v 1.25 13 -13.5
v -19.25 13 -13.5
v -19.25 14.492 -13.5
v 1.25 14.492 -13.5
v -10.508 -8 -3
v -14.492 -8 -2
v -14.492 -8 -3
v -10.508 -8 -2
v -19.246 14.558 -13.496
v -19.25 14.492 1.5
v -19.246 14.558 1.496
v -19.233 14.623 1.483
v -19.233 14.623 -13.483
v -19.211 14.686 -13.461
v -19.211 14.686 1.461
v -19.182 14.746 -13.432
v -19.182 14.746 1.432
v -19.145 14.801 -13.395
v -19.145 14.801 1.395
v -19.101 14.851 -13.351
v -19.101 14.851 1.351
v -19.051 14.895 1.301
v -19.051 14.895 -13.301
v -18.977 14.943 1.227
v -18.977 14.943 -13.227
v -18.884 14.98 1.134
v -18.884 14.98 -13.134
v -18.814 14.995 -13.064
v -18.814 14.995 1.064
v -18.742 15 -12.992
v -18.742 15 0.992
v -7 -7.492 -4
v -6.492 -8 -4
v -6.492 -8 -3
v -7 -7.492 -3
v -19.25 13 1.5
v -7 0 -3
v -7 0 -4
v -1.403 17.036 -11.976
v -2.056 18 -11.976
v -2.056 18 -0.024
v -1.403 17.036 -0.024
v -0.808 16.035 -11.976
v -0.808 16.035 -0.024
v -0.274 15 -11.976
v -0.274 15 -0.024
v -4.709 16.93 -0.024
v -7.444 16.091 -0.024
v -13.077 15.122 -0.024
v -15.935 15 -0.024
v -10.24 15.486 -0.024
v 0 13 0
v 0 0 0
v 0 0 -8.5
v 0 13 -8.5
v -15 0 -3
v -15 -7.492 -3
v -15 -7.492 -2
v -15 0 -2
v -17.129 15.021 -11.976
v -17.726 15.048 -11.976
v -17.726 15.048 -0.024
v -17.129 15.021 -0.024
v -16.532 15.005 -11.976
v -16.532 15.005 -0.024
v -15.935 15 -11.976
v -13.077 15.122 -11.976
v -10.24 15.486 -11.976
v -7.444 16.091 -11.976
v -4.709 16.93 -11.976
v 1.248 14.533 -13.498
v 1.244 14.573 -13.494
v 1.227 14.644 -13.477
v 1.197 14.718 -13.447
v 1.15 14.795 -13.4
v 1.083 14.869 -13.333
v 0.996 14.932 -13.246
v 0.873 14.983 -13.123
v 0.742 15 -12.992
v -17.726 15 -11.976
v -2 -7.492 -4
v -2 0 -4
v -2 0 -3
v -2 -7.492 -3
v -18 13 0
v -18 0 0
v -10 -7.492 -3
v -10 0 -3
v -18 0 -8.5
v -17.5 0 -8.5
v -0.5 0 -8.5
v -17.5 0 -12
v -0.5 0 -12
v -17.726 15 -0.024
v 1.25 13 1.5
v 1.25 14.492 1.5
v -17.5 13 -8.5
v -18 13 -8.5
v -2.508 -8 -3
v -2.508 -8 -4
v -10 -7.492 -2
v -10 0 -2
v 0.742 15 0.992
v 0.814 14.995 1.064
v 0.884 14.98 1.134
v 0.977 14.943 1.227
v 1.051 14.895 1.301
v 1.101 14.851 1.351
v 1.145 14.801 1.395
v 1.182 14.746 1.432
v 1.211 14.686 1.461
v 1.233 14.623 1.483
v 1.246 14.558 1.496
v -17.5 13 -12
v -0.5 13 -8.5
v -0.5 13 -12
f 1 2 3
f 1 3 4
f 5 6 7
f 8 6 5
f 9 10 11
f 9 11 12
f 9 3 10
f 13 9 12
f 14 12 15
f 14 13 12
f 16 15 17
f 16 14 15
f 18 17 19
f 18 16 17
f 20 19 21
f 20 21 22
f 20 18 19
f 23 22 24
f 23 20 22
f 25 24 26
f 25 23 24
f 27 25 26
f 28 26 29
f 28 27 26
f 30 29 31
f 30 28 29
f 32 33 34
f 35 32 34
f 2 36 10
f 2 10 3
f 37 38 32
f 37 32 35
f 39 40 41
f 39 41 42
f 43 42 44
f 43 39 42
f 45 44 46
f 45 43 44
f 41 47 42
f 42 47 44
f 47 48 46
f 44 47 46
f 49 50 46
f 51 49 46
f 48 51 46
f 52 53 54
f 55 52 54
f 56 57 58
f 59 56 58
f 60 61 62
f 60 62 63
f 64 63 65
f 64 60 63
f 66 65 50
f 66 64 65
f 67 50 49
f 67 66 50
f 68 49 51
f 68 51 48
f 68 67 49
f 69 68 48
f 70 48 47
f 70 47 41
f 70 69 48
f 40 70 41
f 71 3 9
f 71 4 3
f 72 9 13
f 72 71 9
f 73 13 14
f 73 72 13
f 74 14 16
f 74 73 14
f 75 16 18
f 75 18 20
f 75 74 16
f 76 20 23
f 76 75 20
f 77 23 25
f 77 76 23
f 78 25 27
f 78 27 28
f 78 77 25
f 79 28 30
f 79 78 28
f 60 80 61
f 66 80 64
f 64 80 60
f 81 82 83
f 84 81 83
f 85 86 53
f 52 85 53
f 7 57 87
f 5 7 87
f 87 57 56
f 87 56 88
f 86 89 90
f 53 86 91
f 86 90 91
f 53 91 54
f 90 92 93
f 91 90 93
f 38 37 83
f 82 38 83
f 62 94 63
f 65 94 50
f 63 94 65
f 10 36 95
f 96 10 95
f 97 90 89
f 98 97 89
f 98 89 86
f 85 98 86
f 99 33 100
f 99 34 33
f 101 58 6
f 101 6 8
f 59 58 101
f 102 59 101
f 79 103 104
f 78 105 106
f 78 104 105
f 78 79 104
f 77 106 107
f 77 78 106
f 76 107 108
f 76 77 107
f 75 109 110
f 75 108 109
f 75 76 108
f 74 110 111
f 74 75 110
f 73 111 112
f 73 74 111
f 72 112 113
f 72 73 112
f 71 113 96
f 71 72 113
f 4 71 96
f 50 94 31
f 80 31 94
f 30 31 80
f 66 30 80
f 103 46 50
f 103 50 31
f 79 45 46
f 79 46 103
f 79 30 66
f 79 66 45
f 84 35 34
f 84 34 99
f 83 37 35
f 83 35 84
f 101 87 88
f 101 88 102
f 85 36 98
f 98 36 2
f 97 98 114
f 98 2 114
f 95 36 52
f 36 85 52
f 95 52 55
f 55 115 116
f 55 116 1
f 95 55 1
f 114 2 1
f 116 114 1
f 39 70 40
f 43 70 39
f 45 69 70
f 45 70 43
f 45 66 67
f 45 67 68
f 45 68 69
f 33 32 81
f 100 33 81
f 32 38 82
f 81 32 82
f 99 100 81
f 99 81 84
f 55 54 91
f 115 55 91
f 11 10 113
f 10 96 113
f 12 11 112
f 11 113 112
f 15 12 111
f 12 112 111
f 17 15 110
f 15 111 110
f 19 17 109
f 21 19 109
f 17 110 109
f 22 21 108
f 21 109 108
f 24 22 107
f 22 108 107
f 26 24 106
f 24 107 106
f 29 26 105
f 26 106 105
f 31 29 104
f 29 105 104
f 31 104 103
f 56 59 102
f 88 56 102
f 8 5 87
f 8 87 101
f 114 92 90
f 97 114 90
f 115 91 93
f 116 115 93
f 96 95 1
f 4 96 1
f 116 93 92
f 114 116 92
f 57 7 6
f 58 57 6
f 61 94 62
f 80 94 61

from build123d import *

# Parameters (mm, degrees)
BOSS_EXTRUDE1_DEPTH   = 13
SKETCH2_W             = 20.5
SKETCH2_H             = 15
BOSS_EXTRUDE2_DEPTH   = 2
FILLET1_R             = 0.508
SKETCH3_W             = 17.452
SKETCH3_H             = 11.952
BOSS_EXTRUDE3_DEPTH   = 3
CUT_EXTRUDE2_START    = -11.952
CUT_EXTRUDE2_DEPTH    = 11.952
SKETCH6_W             = 5
SKETCH6_H             = 1
BOSS_EXTRUDE4_DEPTH   = 8
BOSS_EXTRUDE4_2_DEPTH = 8
CHAMFER1_SIZE         = 0.508
CHAMFER2_SIZE         = 0.508


# Read off the part's stored shape, not the designer's step: Cut-Extrude2
with BuildPart() as part:
    # Sketch1 → Boss-Extrude1 (new body)
    with BuildSketch(Plane(origin=(0, 0, 0), x_dir=(1, 0, 0), z_dir=(0, 1, 0))):
        Polygon((-17.5, 12), (-17.5, 8.5), (-18, 8.5), (-18, 0), (0, 0), (0, 8.5), (-0.5, 8.5), (-0.5, 12), align=None)
    extrude(amount=BOSS_EXTRUDE1_DEPTH)

    # Sketch2 → Boss-Extrude2 (add)
    with BuildSketch(Plane(origin=(0, 13, 0), x_dir=(1, 0, 0), z_dir=(0, 1, 0))):
        with Locations((-9, 6)):
            Rectangle(SKETCH2_W, SKETCH2_H)
    extrude(amount=BOSS_EXTRUDE2_DEPTH)

    # Fillet1
    fillet1_edges = [part.edges().sort_by_distance(p)[0] for p in [
        (-19.25, 15, -6),
        (-9, 15, 1.5),
        (1.25, 15, -6),
        (-9, 15, -13.5),
    ]]
    fillet(fillet1_edges, radius=FILLET1_R)

    # Sketch3 → Boss-Extrude3 (add)
    with BuildSketch(Plane(origin=(0, 15, 0), x_dir=(1, 0, 0), z_dir=(0, 1, 0))):
        with Locations((-9, 6)):
            Rectangle(SKETCH3_W, SKETCH3_H)
    extrude(amount=BOSS_EXTRUDE3_DEPTH)

    # Cut-Extrude2 outline → Cut-Extrude2 (cut)
    with BuildSketch(Plane.XY.offset(-0.024).offset(CUT_EXTRUDE2_START)):
        with BuildLine():
            Line((-0.274, 18), (-2.056001882, 18))
            ThreePointArc((-2.056001882, 18), (-1.098307975, 16.539615664), (-0.274, 15))
            Line((-0.274, 15), (-0.274, 18))
        make_face()
        with BuildLine():
            ThreePointArc((-17.726, 15.047770582), (-9.713352624, 15.580954239), (-2.056001882, 18))
            Line((-2.056001882, 18), (-17.726, 18))
            Line((-17.726, 18), (-17.726, 15.047770582))
        make_face()
    extrude(amount=CUT_EXTRUDE2_DEPTH, mode=Mode.SUBTRACT)


with BuildPart() as body_2:
    # Sketch6 → Boss-Extrude4 (new body)
    with BuildSketch(Plane.XZ):
        with Locations((-4.5, -3.5)):
            Rectangle(SKETCH6_W, SKETCH6_H)
    extrude(amount=BOSS_EXTRUDE4_DEPTH)

    # Chamfer2
    chamfer2_edges = [body_2.edges().sort_by_distance(p)[0] for p in [
        (-2, -8, -3.5),
        (-7, -8, -3.5),
    ]]
    chamfer(chamfer2_edges, length=CHAMFER2_SIZE)


with BuildPart() as body_3:
    # Sketch6 → Boss-Extrude4 2 (new body)
    with BuildSketch(Plane.XZ):
        with Locations((-12.5, -2.5)):
            Rectangle(SKETCH6_W, SKETCH6_H)
    extrude(amount=BOSS_EXTRUDE4_2_DEPTH)

    # Chamfer1
    chamfer1_edges = [body_3.edges().sort_by_distance(p)[0] for p in [
        (-10, -8, -2.5),
        (-15, -8, -2.5),
    ]]
    chamfer(chamfer1_edges, length=CHAMFER1_SIZE)


solid = Compound([part.part, body_2.part, body_3.part])
